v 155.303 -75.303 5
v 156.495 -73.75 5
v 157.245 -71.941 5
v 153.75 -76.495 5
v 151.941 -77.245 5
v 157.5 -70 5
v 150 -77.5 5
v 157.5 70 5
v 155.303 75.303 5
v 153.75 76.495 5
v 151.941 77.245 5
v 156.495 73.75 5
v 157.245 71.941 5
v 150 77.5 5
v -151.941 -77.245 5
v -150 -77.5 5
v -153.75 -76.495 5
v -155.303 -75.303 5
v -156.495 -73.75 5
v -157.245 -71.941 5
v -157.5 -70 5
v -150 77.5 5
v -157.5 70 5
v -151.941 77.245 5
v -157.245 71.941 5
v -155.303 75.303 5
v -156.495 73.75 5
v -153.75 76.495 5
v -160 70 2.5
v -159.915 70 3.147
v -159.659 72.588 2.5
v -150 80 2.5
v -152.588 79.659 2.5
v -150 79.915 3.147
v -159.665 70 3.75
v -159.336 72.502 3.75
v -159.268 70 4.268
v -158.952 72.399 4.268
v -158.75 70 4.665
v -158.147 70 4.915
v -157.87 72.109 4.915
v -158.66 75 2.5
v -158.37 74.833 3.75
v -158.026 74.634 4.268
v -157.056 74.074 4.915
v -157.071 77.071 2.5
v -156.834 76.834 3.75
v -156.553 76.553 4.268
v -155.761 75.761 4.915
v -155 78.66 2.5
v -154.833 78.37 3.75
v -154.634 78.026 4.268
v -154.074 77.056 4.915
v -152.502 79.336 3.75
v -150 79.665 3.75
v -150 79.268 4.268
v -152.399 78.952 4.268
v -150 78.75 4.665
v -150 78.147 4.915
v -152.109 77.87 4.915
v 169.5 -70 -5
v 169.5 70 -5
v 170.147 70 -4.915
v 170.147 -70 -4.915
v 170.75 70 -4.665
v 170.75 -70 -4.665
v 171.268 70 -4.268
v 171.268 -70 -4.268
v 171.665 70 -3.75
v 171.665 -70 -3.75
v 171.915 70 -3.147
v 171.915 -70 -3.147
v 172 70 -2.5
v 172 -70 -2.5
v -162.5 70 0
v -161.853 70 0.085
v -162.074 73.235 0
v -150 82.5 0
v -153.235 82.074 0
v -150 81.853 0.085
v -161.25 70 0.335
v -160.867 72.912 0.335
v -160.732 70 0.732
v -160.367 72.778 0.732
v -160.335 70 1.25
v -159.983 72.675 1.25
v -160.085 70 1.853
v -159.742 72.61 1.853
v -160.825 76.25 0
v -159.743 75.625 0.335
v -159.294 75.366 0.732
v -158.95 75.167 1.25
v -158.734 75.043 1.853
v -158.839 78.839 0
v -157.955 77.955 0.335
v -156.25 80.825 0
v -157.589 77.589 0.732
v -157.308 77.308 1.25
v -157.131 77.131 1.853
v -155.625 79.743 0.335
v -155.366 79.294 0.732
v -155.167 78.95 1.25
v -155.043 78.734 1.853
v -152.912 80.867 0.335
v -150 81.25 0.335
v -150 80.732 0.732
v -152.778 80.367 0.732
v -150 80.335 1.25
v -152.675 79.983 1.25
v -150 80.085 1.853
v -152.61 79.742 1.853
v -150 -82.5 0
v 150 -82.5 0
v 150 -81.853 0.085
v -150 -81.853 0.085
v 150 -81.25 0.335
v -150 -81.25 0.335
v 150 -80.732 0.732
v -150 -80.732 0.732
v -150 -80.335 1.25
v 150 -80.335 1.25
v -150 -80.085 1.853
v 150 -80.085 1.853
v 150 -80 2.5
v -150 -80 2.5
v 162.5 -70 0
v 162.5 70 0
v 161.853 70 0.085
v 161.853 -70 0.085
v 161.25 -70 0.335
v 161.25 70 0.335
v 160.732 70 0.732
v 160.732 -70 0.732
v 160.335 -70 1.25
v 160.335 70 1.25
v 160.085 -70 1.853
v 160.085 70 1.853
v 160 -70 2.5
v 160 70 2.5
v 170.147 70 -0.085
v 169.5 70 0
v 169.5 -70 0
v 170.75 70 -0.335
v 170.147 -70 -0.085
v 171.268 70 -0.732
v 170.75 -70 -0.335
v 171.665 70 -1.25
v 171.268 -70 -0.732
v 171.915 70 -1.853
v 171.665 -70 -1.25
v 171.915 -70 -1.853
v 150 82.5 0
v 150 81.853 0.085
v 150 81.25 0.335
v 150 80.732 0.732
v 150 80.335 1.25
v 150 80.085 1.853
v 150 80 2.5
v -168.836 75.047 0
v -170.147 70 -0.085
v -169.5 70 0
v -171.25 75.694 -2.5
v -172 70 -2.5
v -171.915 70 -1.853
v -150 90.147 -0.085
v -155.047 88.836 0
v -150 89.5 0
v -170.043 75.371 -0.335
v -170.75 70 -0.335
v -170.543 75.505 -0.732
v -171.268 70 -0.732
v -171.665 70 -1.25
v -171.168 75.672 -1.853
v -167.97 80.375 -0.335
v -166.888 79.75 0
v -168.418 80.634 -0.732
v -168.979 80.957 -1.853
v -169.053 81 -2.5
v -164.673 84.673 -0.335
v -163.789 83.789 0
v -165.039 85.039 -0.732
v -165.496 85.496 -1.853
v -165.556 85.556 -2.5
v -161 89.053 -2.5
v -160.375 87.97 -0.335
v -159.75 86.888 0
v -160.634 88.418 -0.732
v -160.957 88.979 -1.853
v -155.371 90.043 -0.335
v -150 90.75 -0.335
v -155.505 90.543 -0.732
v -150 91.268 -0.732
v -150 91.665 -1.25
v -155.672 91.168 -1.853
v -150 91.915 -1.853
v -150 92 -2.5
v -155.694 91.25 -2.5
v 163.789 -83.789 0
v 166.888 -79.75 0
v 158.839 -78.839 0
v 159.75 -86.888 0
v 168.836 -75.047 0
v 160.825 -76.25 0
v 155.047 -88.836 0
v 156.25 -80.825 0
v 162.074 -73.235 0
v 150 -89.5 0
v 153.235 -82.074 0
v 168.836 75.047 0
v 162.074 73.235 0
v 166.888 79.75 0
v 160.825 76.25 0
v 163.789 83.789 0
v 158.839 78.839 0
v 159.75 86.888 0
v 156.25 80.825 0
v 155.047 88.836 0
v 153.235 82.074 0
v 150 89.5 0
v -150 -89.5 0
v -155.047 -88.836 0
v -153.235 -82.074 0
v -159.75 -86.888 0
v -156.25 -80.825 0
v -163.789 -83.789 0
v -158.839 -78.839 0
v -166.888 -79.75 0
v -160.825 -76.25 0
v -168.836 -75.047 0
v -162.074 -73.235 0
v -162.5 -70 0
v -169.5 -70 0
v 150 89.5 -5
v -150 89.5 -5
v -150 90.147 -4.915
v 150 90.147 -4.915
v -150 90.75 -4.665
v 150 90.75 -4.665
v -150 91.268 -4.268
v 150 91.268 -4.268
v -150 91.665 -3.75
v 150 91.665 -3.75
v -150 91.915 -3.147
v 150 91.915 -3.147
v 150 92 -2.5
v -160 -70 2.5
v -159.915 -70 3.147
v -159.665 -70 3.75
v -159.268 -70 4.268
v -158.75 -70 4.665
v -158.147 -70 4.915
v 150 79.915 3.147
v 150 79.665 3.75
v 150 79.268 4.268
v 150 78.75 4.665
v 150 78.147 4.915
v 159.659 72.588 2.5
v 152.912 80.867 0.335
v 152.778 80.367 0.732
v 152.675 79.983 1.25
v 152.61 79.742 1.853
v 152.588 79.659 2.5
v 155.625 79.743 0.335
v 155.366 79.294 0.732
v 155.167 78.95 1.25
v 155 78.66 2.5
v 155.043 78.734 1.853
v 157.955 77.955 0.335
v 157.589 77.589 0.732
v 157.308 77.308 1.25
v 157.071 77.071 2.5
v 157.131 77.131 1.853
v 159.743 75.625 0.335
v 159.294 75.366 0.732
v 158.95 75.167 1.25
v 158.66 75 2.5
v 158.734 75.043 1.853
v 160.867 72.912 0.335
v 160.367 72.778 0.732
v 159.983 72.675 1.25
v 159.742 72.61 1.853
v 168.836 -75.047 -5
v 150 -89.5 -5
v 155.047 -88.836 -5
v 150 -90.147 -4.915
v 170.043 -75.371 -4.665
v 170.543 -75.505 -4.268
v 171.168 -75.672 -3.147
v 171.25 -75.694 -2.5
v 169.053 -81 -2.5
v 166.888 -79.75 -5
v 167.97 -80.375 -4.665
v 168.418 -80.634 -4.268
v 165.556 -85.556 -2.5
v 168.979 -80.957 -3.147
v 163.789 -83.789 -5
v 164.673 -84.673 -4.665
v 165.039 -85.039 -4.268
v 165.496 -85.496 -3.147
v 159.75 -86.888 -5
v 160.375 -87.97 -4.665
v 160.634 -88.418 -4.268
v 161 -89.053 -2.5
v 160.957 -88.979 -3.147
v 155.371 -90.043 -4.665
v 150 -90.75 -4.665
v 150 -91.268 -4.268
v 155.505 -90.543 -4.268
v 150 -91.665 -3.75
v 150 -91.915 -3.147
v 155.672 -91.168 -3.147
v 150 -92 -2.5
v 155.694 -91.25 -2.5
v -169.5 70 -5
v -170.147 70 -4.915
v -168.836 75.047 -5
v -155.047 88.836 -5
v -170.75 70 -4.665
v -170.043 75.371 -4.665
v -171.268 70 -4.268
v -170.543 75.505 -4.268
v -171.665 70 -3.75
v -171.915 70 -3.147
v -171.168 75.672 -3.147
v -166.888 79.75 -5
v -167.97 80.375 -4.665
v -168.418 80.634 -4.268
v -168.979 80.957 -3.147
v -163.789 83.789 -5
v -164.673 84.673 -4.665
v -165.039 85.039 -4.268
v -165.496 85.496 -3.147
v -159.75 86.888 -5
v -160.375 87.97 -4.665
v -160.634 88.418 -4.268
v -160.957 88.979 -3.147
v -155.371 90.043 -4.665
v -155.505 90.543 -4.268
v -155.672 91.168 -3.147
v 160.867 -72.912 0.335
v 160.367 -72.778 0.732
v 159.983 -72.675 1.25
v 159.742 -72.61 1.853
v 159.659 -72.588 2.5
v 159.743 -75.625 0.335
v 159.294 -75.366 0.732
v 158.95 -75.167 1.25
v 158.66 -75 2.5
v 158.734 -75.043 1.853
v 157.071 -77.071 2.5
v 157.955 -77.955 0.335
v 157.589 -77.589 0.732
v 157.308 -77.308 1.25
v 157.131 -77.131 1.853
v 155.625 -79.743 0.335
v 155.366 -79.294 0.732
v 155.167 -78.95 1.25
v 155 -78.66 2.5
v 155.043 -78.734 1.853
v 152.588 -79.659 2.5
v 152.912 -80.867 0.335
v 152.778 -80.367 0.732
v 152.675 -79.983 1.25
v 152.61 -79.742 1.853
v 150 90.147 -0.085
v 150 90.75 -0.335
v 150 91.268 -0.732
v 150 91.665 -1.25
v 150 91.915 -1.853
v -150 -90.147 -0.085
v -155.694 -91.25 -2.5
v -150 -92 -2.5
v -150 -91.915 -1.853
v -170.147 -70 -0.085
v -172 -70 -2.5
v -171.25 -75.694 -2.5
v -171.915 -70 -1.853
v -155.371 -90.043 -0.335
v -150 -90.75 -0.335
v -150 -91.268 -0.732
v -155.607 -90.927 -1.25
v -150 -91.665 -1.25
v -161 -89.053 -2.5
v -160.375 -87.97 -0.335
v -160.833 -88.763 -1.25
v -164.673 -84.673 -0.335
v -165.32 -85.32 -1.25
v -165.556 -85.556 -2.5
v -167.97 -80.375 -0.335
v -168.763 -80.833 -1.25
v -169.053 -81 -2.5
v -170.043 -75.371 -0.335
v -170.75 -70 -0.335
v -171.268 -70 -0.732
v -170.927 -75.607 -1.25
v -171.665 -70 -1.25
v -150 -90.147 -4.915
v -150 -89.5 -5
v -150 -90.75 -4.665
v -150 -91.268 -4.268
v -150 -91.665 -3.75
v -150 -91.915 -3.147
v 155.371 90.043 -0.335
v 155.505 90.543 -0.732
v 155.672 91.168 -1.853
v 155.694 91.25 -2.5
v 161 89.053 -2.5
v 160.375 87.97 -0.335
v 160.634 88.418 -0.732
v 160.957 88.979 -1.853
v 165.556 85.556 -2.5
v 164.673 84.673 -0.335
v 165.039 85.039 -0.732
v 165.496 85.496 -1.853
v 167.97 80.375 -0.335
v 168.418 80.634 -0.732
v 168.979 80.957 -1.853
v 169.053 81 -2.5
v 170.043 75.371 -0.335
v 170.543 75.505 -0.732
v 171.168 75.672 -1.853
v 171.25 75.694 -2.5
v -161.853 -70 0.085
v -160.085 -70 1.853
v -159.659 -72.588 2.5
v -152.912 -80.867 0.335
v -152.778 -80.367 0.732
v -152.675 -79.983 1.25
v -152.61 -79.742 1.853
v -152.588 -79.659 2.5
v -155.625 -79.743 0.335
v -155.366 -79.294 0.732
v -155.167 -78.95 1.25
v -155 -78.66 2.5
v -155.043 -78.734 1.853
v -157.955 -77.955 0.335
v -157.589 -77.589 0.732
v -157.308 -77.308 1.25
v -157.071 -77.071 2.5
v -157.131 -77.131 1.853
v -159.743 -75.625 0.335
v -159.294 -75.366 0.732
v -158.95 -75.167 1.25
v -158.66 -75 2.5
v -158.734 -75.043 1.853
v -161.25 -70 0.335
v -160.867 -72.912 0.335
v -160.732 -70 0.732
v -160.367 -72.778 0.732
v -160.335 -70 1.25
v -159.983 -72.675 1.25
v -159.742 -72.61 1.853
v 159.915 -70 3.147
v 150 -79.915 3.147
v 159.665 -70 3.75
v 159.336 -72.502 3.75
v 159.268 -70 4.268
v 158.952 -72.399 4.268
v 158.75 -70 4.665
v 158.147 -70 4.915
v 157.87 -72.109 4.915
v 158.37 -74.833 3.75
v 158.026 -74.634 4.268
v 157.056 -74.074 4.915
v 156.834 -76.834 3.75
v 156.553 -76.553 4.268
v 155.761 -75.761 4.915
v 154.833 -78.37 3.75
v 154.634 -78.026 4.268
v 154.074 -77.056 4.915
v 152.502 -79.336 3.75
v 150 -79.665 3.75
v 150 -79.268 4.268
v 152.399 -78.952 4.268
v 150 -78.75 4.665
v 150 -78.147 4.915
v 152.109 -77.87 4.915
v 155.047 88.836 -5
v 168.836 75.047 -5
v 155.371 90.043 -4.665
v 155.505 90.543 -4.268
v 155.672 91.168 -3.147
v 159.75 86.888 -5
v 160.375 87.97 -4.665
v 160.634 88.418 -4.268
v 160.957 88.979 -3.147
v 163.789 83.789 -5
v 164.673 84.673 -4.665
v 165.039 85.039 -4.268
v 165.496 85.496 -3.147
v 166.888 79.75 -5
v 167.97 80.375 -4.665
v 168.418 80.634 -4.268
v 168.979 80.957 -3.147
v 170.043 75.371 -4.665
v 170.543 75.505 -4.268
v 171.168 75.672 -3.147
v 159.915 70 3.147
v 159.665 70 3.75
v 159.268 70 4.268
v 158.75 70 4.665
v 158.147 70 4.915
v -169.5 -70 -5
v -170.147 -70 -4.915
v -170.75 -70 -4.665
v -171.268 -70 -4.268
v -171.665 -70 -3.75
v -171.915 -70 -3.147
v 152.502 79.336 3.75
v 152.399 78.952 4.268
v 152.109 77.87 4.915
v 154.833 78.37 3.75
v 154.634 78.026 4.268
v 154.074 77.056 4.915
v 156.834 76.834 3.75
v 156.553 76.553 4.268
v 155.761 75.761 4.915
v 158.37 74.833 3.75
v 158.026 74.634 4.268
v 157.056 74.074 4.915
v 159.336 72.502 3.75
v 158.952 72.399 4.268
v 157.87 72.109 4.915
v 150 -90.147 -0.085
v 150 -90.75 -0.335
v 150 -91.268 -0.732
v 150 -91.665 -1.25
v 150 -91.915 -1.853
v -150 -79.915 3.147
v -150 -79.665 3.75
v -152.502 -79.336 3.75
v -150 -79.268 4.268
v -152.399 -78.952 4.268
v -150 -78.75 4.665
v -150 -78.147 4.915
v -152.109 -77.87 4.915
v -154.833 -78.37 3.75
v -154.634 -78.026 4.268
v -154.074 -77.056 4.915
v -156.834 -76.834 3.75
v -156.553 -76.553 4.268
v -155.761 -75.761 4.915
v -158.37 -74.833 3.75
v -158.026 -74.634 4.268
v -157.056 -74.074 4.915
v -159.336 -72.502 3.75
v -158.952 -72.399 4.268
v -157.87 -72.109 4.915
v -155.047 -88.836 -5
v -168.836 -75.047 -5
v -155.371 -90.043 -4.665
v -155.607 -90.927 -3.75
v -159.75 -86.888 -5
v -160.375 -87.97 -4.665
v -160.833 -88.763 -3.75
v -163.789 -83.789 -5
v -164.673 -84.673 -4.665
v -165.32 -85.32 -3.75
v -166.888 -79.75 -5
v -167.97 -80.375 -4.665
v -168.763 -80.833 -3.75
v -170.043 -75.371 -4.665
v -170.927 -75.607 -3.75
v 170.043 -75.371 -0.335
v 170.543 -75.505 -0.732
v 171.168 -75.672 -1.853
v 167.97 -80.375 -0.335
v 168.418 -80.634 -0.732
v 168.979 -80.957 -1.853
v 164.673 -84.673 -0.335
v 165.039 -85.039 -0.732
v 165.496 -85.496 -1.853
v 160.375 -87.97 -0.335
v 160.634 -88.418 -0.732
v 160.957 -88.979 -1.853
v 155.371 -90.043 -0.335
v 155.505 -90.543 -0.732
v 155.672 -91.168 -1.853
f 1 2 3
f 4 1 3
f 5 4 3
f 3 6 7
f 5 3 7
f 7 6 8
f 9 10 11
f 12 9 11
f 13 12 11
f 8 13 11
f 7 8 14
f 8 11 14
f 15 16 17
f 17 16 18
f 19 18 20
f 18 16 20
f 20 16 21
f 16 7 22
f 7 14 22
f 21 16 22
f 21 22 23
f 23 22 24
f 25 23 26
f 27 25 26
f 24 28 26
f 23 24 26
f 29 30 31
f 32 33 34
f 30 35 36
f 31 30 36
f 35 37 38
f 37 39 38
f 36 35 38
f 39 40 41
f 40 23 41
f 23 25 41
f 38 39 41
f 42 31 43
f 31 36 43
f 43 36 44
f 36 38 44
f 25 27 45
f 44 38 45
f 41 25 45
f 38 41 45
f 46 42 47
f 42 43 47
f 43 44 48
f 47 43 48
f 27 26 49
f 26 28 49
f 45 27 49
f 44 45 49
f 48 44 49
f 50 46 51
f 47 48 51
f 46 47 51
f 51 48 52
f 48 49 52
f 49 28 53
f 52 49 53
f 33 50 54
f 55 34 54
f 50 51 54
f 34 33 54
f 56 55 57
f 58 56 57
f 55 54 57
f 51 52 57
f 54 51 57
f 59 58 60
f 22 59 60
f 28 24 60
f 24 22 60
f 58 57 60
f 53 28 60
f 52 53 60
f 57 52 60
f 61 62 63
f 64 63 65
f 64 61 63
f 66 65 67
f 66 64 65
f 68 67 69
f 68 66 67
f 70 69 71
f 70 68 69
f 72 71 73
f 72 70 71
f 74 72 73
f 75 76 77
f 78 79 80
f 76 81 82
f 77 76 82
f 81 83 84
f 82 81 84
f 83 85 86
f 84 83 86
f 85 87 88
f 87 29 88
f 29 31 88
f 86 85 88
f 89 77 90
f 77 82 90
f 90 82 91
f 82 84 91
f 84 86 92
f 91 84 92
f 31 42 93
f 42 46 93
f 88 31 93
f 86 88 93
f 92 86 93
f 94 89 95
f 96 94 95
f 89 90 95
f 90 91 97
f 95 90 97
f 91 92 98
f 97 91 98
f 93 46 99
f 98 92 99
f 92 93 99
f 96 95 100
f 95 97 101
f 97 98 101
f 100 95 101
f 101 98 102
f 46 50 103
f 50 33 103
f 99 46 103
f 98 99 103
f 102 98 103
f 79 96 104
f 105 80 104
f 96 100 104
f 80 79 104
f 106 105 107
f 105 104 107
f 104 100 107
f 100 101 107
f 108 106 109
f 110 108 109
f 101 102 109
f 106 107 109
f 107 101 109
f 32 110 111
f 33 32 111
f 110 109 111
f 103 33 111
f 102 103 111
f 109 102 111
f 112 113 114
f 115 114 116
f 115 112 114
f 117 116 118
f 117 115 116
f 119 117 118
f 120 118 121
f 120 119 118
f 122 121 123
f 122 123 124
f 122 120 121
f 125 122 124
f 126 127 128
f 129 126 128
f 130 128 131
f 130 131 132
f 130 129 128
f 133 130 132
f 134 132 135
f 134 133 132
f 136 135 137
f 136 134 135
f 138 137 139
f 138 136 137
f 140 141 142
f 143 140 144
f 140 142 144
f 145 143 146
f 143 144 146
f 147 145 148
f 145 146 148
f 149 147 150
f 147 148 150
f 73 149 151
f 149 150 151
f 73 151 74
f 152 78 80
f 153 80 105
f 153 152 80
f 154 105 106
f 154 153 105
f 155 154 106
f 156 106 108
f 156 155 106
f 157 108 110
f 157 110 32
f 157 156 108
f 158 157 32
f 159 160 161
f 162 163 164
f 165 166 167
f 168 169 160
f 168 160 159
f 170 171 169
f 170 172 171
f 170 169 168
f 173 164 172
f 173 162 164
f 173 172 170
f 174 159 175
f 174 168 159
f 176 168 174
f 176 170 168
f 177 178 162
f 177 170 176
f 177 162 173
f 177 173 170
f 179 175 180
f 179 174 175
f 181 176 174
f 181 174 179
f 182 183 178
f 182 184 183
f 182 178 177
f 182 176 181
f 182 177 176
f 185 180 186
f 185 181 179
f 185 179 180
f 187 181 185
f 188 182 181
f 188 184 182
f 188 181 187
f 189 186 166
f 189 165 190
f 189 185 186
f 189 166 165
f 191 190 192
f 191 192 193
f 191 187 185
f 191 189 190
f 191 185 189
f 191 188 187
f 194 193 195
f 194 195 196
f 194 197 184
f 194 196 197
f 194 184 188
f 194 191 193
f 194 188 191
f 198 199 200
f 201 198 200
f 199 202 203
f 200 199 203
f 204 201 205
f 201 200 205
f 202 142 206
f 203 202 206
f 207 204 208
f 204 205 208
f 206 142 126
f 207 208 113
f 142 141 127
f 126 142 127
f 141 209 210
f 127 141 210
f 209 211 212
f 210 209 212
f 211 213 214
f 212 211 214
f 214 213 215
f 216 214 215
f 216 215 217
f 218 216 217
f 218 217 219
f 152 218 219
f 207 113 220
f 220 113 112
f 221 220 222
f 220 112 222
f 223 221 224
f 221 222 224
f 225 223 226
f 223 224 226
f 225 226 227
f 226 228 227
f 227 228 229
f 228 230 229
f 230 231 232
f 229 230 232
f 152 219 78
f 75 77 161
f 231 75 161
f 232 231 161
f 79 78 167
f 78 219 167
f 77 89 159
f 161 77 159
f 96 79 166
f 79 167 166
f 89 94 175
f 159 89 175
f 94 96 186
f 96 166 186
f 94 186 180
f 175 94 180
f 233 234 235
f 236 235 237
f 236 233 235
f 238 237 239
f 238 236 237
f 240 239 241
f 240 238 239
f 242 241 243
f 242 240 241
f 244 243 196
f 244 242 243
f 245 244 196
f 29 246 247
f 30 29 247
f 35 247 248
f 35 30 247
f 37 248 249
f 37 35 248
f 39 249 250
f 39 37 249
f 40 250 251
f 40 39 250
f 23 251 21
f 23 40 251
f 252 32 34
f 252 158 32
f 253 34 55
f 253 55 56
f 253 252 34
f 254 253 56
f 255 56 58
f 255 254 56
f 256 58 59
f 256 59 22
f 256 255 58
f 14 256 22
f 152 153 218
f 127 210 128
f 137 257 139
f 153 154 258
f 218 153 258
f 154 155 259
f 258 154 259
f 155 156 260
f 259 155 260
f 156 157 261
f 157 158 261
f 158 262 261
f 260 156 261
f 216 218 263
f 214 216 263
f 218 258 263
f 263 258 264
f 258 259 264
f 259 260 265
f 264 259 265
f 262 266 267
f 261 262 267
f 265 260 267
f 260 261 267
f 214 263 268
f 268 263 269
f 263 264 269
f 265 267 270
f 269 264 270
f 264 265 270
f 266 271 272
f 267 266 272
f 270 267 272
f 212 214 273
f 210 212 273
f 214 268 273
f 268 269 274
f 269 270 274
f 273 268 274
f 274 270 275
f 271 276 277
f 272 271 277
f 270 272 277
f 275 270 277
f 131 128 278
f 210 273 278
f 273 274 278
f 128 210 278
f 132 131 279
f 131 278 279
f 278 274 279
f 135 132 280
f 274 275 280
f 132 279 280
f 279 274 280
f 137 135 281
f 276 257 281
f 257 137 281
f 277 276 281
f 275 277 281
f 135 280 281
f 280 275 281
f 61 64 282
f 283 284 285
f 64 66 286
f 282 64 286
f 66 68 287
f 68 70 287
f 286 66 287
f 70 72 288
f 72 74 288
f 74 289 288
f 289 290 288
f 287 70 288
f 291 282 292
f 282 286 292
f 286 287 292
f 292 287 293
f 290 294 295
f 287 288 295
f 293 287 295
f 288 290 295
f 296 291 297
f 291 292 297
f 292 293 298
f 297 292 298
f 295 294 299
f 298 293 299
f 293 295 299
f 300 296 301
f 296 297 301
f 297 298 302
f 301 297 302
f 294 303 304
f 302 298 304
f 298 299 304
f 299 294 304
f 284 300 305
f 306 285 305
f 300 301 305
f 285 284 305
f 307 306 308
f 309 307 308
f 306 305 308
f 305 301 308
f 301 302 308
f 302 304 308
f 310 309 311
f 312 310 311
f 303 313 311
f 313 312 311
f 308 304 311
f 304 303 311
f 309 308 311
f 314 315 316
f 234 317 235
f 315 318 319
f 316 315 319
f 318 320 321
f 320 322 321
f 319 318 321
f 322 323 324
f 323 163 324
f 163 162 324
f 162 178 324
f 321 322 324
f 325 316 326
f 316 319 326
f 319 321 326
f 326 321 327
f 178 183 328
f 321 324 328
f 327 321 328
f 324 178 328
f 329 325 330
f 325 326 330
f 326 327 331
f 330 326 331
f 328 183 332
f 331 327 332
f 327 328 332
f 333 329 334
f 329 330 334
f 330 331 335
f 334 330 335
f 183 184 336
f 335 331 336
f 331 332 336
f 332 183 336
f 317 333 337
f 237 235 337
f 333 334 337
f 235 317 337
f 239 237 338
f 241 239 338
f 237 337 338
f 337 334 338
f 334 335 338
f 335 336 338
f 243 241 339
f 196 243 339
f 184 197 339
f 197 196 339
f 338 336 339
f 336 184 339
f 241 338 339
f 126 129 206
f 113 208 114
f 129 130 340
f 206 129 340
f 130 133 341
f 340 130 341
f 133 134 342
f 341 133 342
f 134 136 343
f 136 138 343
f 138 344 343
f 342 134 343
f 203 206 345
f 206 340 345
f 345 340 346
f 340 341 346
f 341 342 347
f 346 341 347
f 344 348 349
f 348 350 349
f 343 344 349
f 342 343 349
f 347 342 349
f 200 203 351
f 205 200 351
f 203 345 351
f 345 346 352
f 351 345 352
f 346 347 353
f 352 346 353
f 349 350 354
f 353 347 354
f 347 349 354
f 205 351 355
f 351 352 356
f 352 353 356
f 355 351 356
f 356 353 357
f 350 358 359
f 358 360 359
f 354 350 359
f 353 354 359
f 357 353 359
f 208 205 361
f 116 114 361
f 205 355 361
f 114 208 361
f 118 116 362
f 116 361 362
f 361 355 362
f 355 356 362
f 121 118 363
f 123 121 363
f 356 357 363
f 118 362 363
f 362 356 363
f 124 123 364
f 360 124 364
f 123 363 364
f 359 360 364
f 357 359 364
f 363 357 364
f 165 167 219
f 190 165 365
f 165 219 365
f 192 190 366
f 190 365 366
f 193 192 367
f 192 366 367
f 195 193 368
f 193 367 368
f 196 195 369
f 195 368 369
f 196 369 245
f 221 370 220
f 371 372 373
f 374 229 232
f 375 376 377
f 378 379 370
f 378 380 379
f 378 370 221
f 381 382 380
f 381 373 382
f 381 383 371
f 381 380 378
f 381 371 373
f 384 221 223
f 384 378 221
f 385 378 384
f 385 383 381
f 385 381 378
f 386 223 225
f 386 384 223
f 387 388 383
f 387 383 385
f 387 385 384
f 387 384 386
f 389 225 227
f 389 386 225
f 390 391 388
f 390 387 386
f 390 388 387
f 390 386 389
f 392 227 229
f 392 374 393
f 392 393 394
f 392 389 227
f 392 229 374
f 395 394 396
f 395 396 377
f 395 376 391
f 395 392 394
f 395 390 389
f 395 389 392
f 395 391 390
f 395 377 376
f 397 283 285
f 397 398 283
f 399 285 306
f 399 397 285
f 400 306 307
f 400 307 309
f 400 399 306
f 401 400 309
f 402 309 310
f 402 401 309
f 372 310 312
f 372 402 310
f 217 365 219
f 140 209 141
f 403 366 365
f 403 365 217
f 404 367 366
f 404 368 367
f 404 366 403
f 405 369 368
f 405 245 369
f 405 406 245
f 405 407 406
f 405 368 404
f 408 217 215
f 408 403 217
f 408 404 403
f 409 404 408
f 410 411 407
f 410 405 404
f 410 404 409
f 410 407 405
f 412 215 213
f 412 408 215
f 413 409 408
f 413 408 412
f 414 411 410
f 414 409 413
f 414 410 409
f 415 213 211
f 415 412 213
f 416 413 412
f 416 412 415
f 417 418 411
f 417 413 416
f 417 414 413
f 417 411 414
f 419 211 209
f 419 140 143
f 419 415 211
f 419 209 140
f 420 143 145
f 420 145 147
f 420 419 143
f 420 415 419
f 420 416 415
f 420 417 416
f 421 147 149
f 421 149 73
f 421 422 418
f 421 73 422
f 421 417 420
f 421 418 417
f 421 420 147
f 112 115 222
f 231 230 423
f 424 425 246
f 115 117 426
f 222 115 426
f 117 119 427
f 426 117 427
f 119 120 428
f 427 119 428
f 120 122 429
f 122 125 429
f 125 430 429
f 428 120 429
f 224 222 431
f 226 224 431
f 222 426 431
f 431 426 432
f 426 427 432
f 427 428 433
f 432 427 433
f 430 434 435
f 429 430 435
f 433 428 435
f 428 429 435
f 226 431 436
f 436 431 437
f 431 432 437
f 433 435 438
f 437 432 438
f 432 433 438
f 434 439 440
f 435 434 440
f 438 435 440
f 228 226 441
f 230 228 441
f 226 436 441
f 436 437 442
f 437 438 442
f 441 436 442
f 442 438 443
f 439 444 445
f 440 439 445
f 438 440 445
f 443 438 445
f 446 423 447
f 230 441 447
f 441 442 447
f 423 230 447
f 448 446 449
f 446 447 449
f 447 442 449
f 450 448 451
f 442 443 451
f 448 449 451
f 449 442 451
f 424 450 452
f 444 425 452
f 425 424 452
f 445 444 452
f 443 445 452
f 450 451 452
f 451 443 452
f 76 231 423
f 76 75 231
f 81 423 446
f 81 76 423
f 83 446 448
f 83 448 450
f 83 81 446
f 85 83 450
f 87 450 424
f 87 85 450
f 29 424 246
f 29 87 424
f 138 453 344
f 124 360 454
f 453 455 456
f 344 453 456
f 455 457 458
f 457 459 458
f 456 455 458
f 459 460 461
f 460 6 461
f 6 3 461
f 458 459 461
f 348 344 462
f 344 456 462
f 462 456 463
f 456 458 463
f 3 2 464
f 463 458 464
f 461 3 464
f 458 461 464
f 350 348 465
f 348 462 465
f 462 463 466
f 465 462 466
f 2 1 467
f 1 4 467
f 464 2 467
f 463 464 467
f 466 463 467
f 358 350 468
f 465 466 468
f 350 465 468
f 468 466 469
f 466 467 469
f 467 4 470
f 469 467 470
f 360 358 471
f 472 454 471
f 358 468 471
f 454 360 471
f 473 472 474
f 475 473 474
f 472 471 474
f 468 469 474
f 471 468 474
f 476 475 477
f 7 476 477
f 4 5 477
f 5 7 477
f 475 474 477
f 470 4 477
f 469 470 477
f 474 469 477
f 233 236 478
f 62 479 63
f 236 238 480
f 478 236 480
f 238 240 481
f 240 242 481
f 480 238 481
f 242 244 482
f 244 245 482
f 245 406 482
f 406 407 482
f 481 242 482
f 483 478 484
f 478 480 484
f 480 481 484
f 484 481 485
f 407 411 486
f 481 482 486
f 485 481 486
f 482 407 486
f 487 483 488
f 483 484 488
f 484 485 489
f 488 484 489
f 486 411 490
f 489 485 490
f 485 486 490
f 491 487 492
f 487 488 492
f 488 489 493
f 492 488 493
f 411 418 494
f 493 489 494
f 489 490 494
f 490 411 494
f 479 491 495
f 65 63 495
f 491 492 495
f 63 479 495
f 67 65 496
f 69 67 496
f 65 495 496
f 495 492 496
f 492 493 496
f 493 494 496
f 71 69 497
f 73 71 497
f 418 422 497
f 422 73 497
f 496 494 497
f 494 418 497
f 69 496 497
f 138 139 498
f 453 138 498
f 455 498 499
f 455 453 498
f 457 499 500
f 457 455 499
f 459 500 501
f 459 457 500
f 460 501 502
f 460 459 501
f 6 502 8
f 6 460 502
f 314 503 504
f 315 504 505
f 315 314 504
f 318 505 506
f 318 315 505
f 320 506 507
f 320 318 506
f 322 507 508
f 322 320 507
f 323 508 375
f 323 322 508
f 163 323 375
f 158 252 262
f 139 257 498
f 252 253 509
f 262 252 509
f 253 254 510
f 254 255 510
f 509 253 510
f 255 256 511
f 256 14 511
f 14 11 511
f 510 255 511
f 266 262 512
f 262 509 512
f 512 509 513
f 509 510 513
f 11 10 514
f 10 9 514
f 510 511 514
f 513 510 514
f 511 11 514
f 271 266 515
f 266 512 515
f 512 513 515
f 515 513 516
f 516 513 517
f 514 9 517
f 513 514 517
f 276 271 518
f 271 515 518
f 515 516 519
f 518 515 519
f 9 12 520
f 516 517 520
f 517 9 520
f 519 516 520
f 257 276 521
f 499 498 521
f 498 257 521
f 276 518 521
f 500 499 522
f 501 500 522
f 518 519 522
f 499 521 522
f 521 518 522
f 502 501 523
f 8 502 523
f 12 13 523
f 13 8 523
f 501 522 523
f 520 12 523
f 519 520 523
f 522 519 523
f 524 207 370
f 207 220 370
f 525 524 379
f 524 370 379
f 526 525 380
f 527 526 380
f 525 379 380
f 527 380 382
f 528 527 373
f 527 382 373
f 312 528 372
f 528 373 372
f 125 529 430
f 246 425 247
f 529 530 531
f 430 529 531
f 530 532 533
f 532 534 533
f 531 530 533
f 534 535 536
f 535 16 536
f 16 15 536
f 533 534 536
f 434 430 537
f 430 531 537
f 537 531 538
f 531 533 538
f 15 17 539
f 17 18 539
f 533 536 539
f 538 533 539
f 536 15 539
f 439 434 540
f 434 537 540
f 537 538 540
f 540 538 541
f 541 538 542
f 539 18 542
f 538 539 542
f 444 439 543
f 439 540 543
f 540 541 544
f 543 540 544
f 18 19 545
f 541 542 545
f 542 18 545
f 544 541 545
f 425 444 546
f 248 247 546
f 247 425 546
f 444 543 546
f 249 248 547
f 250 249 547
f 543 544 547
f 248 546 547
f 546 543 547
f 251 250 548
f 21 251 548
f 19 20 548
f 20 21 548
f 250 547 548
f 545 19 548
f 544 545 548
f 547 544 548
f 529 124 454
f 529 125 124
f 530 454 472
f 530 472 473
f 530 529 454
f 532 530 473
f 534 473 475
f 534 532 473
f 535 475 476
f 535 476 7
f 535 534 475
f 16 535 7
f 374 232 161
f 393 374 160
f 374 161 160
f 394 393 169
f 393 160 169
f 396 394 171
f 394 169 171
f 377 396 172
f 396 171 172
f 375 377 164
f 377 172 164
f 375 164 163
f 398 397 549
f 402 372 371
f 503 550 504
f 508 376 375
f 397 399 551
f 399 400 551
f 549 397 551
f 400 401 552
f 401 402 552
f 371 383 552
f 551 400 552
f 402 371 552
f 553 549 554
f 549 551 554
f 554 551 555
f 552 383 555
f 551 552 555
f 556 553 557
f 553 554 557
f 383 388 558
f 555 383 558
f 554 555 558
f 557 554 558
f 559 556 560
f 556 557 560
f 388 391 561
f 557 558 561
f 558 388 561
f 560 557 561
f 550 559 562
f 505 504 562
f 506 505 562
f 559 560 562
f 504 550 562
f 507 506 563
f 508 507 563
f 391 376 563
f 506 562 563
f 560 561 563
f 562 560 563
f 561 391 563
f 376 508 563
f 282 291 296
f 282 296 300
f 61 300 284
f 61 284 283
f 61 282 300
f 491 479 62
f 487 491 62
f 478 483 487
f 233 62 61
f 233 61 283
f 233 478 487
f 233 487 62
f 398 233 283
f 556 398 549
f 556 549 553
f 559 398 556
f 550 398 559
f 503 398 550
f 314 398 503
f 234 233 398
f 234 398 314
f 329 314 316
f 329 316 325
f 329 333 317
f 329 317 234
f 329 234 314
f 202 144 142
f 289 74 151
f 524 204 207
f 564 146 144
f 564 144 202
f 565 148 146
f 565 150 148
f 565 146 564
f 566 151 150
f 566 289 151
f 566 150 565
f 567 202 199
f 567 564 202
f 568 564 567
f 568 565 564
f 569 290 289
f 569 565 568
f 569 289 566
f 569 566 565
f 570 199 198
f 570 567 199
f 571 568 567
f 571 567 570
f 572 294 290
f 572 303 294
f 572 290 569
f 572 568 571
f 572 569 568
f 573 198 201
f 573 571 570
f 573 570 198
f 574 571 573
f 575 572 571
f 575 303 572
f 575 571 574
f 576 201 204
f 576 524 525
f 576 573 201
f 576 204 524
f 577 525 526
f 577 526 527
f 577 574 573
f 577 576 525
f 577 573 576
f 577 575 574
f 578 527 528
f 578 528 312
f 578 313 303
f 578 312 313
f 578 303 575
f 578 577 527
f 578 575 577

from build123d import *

# Parameters (mm, degrees)
BOSS_EXTRUDE2_DEPTH = 5
BOSS_EXTRUDE3_DEPTH = 5
FILLET4_R           = 2.5


with BuildPart() as part:
    # Sketch3 → Boss-Extrude2 (new body)
    with BuildSketch(Plane.XY):
        with BuildLine():
            Line((-150, 80), (150, 80))
            ThreePointArc((150, 80), (157.071067812, 77.071067812), (160, 70))
            Line((160, 70), (160, -70))
            ThreePointArc((160, -70), (157.071067812, -77.071067812), (150, -80))
            Line((150, -80), (-150, -80))
            ThreePointArc((-150, -80), (-157.071067812, -77.071067812), (-160, -70))
            Line((-160, -70), (-160, 70))
            ThreePointArc((-160, 70), (-157.071067812, 77.071067812), (-150, 80))
        make_face()
    extrude(amount=BOSS_EXTRUDE2_DEPTH)

    # Sketch4 → Boss-Extrude3 (add)
    with BuildSketch(Plane(origin=(0, 0, 0), x_dir=(-1, 0, 0), z_dir=(0, 0, -1))):
        with BuildLine():
            Line((150, 92), (-150, 92))
            ThreePointArc((-150, 92), (-165.556349186, 85.556349186), (-172, 70))
            Line((-172, 70), (-172, -70))
            ThreePointArc((-172, -70), (-165.556349186, -85.556349186), (-150, -92))
            Line((-150, -92), (150, -92))
            ThreePointArc((150, -92), (165.556349186, -85.556349186), (172, -70))
            Line((172, -70), (172, 70))
            ThreePointArc((172, 70), (165.556349186, 85.556349186), (150, 92))
        make_face()
    extrude(amount=BOSS_EXTRUDE3_DEPTH)

    # Fillet4
    fillet4_edges = [part.edges().sort_by_distance(p)[0] for p in [
        (-157.071067812, 77.071067812, 5),
        (0, 80, 5),
        (157.071067812, 77.071067812, 5),
        (160, 0, 5),
        (157.071067812, -77.071067812, 5),
        (-160, 0, 5),
        (0, -80, 5),
        (-157.071067812, -77.071067812, 5),
        (-157.071067812, 77.071067812, 0),
        (0, 80, 0),
        (157.071067812, 77.071067812, 0),
        (160, 0, 0),
        (157.071067812, -77.071067812, 0),
        (0, -80, 0),
        (-157.071067812, -77.071067812, 0),
        (-160, 0, 0),
        (-165.556349186, -85.556349186, -5),
        (0, -92, -5),
        (165.556349186, -85.556349186, -5),
        (172, 0, -5),
        (165.556349186, 85.556349186, -5),
        (0, 92, -5),
        (-165.556349186, 85.556349186, -5),
        (-165.556349186, -85.556349186, 0),
        (0, -92, 0),
        (165.556349186, -85.556349186, 0),
        (172, 0, 0),
        (165.556349186, 85.556349186, 0),
        (0, 92, 0),
        (-165.556349186, 85.556349186, 0),
        (-172, 0, -5),
        (-172, 0, 0),
    ]]
    fillet(fillet4_edges, radius=FILLET4_R - 0.0001)  # a hair under: the kernel refuses the full size


solid = part.part
